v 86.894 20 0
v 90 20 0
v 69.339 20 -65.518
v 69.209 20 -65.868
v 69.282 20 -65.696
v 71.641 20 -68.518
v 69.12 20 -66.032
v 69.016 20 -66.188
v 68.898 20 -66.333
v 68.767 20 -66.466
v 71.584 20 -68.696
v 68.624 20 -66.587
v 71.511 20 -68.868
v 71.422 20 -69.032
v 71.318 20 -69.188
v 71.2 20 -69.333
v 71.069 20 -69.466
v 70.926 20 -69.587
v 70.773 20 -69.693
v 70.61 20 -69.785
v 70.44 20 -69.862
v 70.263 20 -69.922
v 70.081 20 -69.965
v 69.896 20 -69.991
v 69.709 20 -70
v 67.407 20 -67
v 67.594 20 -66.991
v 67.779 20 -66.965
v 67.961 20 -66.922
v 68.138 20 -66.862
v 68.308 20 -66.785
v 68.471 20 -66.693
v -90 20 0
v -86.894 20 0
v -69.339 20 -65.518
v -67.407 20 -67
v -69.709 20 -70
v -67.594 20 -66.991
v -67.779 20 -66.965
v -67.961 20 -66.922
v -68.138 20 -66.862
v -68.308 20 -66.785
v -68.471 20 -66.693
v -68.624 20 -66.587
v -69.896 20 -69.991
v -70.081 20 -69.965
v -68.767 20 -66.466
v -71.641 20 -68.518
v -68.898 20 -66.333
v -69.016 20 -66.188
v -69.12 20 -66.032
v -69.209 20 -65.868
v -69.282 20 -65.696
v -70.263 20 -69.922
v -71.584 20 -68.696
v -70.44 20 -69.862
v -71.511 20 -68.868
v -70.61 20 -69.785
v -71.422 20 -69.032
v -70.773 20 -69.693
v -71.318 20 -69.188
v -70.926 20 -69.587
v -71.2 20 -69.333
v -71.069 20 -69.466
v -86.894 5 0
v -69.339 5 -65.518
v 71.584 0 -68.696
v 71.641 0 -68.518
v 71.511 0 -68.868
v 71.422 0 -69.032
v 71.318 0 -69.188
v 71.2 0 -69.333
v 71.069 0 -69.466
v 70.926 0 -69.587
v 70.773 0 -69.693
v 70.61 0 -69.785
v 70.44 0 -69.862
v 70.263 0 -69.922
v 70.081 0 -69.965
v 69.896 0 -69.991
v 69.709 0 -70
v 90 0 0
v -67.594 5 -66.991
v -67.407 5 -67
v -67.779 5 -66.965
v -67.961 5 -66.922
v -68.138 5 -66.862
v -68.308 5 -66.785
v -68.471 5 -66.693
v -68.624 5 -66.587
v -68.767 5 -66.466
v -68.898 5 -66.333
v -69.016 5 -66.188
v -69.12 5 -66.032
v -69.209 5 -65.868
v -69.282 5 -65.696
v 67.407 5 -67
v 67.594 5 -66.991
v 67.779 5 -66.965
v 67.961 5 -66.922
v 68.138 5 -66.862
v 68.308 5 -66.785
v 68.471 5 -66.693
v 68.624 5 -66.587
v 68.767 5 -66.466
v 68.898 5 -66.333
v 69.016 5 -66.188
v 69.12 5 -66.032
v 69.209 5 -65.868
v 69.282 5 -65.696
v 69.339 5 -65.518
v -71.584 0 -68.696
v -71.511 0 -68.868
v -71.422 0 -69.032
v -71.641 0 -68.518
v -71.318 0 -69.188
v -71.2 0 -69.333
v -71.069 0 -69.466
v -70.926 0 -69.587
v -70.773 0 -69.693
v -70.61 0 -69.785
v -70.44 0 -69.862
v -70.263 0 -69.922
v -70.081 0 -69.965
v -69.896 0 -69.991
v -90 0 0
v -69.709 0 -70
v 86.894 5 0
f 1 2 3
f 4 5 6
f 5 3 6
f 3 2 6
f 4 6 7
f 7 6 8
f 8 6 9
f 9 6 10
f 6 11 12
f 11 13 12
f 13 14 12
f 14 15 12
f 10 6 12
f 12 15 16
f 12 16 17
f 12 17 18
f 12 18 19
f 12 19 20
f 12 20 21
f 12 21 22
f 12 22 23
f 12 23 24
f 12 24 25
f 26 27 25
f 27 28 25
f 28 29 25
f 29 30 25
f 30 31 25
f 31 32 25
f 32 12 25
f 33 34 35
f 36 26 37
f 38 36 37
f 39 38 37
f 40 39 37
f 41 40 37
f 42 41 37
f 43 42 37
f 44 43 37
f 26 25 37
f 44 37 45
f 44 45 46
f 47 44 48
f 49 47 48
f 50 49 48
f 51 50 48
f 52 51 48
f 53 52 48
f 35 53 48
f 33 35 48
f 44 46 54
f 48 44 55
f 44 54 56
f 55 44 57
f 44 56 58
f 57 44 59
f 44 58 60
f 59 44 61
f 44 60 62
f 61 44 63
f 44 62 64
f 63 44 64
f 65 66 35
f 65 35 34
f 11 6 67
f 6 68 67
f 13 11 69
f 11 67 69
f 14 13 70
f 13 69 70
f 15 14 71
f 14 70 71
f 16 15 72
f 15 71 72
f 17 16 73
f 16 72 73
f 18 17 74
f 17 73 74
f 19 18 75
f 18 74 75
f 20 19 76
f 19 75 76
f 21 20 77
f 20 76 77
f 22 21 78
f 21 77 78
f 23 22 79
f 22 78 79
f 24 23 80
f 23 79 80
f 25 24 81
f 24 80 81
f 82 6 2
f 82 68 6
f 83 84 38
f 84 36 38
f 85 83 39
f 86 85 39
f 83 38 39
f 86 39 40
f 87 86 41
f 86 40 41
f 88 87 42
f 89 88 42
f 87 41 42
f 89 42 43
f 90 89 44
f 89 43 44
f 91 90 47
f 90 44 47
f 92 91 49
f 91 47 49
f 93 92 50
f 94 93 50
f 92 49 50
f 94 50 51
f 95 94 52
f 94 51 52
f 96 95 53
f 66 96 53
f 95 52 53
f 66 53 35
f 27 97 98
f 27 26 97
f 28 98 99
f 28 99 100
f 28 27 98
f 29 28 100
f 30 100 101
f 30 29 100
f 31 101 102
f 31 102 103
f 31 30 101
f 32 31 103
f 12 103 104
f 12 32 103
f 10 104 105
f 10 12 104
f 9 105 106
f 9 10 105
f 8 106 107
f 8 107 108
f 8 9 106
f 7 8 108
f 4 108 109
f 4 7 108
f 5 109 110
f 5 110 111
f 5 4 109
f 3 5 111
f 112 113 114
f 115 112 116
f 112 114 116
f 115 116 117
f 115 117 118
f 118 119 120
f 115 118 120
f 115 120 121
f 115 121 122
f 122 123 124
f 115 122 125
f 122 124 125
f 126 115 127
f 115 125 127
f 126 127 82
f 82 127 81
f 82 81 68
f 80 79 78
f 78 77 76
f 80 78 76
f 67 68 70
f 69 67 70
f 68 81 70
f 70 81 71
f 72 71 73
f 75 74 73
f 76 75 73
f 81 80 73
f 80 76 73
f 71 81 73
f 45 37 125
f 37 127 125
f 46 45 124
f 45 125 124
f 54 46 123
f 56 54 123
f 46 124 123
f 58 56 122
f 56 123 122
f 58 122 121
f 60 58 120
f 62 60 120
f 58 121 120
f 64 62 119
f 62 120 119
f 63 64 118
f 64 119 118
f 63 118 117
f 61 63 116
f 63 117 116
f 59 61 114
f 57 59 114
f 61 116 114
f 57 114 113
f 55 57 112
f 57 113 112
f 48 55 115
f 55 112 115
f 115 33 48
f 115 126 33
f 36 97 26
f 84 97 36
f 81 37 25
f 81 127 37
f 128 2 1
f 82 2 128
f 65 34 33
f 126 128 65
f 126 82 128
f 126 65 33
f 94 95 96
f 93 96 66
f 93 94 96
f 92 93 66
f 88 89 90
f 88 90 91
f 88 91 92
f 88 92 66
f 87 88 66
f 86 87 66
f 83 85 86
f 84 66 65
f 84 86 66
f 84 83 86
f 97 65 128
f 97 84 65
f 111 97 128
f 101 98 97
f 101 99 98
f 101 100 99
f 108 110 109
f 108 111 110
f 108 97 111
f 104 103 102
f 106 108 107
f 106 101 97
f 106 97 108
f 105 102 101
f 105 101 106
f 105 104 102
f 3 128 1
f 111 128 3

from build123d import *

# Parameters (mm, degrees)
BOSS_EXTRUDE1_DEPTH = 5
BOSS_EXTRUDE2_DEPTH = 15
FILLET1_R           = 2


with BuildPart() as part:
    # Sketch1 → Boss-Extrude1 (new body)
    with BuildSketch(Plane(origin=(0, 0, 0), x_dir=(1, 0, 0), z_dir=(0, 1, 0))):
        Polygon((71.24355653, 70), (-71.24355653, 70), (-90, 0), (90, 0), align=None)
    extrude(amount=BOSS_EXTRUDE1_DEPTH)

    # Sketch2 → Boss-Extrude2 (add)
    with BuildSketch(Plane(origin=(0, 5, 0), x_dir=(1, 0, 0), z_dir=(0, 1, 0))):
        Polygon((68.941575566, 67), (-68.941575566, 67), (-86.894171459, 0), (-90, 0), (-71.24355653, 70), (71.24355653, 70), (90, 0), (86.894171459, 0), align=None)
    extrude(amount=BOSS_EXTRUDE2_DEPTH)

    # Fillet1
    fillet1_edges = [part.edges().sort_by_distance(p)[0] for p in [
        (-68.941575566, 12.5, -67),
        (68.941575566, 12.5, -67),
        (-71.24355653, 10, -70),
        (71.24355653, 10, -70),
    ]]
    fillet(fillet1_edges, radius=FILLET1_R)


solid = part.part
